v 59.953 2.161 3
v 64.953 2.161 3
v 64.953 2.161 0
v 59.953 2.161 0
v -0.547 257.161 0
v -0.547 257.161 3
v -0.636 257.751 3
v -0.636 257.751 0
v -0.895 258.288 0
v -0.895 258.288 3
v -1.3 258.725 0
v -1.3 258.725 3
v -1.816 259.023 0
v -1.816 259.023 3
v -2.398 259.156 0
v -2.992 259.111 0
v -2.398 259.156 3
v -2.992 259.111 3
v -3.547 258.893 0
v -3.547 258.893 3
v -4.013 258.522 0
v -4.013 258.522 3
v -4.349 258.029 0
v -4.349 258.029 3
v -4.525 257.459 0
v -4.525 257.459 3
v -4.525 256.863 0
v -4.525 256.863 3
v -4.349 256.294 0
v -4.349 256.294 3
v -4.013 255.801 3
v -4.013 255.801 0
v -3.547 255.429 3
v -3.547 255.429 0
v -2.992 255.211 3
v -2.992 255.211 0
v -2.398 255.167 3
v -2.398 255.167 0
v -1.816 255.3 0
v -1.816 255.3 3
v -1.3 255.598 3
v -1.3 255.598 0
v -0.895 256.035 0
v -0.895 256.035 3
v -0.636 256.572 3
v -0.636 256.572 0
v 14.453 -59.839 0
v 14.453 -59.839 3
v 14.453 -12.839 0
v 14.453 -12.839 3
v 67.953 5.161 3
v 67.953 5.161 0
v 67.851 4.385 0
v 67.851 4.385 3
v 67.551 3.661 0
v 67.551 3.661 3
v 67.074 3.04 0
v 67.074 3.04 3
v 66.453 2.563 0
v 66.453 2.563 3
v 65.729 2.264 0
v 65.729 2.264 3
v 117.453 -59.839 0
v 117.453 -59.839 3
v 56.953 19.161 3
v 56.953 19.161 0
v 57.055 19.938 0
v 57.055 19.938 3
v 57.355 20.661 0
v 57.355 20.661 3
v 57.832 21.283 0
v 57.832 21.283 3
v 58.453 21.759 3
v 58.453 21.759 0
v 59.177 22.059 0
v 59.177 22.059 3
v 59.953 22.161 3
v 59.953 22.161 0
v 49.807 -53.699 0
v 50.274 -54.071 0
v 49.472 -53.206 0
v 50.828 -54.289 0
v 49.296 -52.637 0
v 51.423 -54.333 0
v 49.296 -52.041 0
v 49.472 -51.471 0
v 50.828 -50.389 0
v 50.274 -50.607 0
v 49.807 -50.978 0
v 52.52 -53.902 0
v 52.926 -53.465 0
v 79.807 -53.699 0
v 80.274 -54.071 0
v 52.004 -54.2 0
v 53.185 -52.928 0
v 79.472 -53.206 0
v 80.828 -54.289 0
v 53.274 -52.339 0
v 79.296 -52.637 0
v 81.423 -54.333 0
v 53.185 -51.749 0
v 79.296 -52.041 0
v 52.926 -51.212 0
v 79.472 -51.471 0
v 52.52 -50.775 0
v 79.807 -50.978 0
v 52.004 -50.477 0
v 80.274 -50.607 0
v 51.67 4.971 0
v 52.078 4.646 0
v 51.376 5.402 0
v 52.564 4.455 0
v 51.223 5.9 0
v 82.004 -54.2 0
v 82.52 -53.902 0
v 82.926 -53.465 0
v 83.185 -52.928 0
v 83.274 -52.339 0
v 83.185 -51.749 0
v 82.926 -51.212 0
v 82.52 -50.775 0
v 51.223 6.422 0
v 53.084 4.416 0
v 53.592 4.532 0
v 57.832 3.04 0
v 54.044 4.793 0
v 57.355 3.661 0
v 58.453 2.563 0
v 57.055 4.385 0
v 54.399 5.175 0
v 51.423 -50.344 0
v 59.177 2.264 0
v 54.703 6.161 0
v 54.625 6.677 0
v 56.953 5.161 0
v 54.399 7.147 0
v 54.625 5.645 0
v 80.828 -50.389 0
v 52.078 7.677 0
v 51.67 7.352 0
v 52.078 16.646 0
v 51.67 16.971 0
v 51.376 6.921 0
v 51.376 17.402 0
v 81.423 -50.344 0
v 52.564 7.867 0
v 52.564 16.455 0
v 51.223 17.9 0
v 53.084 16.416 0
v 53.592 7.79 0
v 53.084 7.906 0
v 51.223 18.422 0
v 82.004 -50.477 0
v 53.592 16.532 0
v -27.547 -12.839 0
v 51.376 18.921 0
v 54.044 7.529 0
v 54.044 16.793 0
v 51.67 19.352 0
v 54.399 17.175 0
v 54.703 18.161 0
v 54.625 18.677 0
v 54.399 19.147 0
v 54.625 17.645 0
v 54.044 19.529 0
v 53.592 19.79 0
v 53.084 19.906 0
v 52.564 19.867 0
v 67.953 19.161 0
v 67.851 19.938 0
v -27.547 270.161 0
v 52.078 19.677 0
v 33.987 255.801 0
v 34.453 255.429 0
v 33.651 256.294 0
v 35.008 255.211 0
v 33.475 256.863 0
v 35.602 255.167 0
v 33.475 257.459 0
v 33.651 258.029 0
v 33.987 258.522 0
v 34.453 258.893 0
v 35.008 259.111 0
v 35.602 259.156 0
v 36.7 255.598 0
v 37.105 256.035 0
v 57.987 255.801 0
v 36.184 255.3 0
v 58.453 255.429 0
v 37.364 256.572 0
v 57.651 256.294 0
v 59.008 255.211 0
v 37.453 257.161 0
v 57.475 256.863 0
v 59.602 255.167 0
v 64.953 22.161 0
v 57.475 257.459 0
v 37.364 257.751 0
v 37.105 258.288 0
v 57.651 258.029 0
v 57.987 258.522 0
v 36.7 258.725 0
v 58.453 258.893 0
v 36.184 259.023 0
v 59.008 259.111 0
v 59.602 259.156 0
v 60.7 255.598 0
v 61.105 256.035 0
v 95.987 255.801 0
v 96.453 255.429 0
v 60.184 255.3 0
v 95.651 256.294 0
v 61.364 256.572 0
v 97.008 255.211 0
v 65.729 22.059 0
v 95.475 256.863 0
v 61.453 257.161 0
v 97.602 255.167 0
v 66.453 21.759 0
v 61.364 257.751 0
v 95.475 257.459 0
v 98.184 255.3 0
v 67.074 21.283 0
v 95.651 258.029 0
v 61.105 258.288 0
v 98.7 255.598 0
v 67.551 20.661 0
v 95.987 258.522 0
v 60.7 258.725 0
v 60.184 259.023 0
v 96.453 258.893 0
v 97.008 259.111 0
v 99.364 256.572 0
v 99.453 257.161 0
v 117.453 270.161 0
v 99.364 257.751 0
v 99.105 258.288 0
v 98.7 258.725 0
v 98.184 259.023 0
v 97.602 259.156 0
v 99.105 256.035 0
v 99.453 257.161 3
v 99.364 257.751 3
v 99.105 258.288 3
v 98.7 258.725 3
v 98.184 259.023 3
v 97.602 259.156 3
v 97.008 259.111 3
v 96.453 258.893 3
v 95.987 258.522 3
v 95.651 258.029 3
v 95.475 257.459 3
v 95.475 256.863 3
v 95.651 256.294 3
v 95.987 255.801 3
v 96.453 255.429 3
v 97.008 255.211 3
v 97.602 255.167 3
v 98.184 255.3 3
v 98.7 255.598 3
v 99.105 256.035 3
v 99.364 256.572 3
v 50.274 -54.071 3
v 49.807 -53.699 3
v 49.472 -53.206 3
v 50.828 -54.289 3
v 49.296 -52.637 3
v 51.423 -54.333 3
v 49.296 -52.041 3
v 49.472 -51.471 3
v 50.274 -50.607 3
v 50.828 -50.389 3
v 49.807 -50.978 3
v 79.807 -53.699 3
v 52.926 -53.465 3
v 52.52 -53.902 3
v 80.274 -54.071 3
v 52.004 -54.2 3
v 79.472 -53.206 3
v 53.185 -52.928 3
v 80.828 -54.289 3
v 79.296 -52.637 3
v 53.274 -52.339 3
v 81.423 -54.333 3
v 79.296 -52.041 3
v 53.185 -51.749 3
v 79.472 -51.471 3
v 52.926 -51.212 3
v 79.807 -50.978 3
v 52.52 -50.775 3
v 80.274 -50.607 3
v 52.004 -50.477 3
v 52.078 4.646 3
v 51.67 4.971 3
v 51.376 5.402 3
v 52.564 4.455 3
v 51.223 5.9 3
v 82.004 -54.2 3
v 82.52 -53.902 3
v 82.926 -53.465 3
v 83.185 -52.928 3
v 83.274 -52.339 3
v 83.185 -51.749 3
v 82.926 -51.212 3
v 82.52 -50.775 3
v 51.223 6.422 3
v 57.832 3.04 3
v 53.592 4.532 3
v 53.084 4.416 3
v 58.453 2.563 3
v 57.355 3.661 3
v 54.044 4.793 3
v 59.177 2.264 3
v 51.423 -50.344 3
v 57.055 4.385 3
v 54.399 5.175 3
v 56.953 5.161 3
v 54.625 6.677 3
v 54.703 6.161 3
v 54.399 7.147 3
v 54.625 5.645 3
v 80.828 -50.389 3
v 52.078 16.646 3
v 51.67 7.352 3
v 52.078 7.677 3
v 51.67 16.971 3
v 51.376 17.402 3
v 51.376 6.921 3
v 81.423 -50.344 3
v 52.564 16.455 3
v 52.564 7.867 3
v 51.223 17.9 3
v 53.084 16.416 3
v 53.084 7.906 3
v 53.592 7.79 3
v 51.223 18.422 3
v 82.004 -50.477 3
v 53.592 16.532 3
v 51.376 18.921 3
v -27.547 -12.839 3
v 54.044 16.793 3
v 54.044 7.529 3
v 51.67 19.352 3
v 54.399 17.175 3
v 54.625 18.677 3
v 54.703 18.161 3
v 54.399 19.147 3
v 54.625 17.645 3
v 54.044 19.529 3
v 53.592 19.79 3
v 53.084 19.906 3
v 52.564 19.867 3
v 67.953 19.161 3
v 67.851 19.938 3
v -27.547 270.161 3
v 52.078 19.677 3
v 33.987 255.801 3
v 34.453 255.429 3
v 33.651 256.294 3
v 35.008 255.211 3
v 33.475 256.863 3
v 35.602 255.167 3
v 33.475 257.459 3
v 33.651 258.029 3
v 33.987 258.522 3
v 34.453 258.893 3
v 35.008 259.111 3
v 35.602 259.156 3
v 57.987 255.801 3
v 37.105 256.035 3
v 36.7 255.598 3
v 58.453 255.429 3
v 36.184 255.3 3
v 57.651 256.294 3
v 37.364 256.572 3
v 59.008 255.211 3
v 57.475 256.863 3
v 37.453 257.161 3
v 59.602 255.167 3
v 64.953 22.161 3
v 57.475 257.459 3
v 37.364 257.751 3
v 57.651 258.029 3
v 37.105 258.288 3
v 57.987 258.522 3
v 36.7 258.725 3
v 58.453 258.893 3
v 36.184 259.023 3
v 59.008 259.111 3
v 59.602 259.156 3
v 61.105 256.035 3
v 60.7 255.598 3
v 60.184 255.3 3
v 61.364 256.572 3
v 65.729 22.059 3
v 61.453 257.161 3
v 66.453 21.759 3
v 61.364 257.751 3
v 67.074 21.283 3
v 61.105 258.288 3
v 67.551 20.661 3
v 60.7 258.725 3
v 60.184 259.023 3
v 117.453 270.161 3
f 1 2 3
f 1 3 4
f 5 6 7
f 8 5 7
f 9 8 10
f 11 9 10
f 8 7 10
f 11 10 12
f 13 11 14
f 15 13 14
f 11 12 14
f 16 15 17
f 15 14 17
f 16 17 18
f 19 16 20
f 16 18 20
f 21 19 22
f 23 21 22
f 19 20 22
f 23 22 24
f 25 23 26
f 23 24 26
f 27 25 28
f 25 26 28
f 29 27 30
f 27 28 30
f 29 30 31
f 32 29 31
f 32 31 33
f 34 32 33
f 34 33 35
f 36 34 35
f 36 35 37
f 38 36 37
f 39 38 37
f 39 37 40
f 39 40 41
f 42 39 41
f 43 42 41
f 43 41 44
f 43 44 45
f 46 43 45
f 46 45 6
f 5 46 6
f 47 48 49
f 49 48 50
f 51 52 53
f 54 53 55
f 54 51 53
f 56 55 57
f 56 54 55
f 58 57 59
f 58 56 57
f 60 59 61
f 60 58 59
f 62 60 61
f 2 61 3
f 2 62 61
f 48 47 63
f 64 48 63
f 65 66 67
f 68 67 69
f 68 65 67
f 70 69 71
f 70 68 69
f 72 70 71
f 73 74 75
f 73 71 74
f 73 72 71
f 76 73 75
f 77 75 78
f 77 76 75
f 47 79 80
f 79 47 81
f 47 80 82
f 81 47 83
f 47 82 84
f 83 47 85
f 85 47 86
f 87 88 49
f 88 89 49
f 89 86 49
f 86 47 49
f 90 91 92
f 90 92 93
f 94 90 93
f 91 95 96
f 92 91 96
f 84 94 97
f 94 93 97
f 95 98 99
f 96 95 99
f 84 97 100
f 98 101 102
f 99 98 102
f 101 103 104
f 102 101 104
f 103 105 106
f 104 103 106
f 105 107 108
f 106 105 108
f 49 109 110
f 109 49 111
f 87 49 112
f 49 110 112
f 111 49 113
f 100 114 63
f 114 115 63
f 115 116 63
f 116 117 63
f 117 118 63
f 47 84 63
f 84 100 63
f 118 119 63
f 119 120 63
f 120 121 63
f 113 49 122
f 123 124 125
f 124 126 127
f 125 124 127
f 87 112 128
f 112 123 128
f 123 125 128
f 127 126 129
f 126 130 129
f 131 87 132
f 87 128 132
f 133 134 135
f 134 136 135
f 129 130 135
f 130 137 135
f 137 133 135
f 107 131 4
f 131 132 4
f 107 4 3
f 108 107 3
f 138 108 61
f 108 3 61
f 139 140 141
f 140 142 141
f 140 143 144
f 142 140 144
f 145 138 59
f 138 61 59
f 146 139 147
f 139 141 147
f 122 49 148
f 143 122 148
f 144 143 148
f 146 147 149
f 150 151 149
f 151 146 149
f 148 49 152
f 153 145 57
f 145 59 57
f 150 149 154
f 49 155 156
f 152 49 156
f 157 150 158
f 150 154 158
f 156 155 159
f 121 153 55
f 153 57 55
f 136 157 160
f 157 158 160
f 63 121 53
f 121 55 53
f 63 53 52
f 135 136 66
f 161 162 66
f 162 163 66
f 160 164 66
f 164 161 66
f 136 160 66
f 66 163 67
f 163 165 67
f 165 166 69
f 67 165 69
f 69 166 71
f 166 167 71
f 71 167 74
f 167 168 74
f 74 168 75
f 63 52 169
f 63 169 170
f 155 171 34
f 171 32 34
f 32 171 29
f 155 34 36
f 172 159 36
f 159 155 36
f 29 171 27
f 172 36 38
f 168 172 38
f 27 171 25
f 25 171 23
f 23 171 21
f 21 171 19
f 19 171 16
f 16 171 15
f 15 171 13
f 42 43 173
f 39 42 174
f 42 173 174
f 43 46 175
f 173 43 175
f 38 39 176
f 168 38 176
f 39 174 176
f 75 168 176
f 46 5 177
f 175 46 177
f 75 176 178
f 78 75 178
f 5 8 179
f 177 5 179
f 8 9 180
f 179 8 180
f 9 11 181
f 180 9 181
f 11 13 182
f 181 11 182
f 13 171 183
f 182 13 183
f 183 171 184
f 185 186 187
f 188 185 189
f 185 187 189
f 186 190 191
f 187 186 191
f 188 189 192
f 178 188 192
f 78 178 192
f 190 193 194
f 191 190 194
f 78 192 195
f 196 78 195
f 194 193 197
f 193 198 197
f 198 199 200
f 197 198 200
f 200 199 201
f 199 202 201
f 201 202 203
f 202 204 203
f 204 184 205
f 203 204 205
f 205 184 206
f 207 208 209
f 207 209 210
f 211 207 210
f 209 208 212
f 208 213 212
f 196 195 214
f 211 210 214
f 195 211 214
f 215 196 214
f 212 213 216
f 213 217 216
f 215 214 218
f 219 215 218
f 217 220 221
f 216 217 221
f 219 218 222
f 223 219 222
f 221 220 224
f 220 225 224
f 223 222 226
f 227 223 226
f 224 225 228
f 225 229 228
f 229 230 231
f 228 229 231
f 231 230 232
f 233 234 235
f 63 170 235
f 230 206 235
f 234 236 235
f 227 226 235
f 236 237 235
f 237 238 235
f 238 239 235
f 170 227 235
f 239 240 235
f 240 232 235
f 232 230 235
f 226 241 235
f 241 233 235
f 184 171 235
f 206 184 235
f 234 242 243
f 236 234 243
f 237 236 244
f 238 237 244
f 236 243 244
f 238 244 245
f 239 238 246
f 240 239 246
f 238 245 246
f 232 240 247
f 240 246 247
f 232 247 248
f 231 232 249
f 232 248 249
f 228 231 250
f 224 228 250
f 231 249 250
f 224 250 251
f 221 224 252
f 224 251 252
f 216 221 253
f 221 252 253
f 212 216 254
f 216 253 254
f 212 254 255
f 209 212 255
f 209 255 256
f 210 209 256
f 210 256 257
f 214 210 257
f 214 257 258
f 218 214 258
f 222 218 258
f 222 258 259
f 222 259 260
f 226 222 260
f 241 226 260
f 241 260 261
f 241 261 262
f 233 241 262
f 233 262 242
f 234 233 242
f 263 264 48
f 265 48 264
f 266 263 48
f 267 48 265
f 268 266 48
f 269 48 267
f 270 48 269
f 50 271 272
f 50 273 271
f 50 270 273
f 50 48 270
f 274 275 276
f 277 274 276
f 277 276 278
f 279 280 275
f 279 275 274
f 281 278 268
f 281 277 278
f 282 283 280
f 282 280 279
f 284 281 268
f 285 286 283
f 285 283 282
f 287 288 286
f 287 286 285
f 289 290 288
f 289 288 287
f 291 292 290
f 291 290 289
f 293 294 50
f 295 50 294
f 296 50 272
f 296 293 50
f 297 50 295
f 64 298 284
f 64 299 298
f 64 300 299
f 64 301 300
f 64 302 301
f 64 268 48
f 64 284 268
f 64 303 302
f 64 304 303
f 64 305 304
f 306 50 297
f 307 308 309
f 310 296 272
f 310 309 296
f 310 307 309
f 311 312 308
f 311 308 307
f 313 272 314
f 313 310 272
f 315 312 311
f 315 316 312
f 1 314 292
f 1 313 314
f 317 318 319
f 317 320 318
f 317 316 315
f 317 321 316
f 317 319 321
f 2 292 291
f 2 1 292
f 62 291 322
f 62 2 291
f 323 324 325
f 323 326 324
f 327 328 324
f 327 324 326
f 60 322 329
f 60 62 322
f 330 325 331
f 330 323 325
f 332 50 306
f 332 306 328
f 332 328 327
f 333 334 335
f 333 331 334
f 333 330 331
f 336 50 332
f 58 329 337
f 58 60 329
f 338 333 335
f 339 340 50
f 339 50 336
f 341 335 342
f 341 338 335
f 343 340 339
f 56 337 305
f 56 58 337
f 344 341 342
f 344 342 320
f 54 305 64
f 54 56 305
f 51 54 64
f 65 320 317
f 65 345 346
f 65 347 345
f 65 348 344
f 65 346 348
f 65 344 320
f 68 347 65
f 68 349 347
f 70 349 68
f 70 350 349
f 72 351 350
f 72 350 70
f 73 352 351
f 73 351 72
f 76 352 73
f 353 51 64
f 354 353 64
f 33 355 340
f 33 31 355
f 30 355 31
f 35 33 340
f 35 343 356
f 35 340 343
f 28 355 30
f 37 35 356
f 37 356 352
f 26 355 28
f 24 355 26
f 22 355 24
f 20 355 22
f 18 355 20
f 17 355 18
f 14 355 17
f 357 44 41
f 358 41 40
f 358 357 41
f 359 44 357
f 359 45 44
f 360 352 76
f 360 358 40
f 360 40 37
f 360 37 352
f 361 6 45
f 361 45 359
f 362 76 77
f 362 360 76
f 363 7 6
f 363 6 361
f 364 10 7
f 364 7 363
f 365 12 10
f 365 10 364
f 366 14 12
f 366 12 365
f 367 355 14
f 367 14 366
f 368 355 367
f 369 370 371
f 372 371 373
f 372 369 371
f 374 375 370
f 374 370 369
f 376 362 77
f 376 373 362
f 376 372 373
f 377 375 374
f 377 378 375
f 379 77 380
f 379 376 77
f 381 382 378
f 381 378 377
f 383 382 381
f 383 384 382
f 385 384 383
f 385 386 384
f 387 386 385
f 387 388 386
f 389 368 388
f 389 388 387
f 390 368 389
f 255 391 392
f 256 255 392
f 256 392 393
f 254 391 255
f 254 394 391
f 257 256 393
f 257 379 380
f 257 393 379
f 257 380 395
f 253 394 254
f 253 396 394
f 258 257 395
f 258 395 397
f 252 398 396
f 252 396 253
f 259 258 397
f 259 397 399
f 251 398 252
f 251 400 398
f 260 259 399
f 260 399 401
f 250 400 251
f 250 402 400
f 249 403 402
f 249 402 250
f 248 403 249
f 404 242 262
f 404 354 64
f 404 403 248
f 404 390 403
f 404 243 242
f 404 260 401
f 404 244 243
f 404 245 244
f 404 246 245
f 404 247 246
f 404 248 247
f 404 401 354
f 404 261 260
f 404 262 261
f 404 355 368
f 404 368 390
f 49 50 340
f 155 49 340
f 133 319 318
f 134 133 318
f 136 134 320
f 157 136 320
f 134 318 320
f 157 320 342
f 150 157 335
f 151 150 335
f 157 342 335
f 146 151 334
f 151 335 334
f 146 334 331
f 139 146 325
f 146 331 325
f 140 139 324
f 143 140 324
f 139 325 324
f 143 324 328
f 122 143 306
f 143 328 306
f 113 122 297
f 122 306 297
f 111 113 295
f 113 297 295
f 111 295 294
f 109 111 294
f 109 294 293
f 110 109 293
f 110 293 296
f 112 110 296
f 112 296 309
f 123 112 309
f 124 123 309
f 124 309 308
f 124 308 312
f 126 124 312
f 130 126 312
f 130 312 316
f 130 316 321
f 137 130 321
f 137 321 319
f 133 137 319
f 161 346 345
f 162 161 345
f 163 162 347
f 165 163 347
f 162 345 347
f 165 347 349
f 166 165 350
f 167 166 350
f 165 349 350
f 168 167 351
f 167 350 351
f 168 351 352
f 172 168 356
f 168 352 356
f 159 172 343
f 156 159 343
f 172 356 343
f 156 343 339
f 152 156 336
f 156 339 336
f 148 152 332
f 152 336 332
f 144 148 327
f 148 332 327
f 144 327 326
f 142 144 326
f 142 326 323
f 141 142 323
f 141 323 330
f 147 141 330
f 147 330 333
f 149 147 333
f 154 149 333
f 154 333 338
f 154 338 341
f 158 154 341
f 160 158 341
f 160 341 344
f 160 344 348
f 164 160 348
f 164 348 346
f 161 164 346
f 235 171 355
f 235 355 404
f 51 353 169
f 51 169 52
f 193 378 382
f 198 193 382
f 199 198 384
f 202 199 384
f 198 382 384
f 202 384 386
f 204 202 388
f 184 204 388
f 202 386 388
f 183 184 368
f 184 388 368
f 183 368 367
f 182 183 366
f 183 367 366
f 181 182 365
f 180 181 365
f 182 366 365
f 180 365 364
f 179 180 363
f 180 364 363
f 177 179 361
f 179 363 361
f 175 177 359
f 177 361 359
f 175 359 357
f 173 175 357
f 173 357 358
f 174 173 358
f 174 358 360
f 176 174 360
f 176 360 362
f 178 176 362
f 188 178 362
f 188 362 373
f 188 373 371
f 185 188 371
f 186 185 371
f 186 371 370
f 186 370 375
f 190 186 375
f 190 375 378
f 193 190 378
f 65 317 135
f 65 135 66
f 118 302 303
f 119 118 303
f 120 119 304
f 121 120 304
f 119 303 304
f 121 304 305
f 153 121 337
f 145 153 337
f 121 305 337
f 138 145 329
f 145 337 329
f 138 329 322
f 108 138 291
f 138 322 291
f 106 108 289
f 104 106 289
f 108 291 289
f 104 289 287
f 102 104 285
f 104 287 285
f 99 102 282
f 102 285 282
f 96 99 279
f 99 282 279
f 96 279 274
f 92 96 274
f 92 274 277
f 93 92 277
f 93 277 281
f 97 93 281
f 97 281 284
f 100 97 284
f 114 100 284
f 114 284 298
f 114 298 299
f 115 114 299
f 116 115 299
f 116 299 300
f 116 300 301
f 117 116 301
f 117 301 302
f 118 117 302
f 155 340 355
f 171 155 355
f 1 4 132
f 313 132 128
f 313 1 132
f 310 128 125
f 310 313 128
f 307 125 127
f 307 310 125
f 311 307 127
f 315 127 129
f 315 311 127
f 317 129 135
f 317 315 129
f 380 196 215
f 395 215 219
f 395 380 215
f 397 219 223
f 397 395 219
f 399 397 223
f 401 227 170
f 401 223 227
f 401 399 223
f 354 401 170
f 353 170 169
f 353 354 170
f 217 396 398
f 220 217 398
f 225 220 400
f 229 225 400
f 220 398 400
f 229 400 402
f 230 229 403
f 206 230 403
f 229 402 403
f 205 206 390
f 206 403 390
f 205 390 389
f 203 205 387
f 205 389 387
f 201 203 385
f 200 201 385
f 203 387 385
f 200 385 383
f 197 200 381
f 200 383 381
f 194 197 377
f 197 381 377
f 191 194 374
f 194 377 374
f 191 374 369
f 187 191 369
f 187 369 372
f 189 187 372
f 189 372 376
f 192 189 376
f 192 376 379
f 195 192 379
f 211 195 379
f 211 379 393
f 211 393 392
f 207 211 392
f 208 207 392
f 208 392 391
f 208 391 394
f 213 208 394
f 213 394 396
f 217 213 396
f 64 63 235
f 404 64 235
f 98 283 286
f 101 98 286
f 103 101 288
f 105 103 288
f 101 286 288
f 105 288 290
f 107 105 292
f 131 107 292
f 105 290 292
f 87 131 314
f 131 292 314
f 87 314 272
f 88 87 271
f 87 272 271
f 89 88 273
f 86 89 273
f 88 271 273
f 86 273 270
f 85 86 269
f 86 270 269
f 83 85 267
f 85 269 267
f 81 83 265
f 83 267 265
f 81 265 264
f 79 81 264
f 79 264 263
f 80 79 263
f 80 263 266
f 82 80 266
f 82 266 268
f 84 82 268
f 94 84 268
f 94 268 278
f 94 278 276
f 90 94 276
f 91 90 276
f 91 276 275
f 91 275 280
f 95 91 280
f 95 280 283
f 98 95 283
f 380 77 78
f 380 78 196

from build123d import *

# Parameters (mm, degrees)
ESQUISSE1_W             = 155
ESQUISSE1_H             = 330
BOSS_EXTRU_1_DEPTH      = 3
ENL_V_MAT_EXTRU_1_DEPTH = 10
ESQUISSE3_R             = 2
ENL_V_MAT_EXTRU_2_DEPTH = 10
ESQUISSE4_R             = 1.75
ENL_V_MAT_EXTRU_3_DEPTH = 10


with BuildPart() as part:
    # Esquisse1 → Boss.-Extru.1 (new body)
    with BuildSketch(Plane.XY):
        with Locations((39.953008068, 105.161286668)):
            Rectangle(ESQUISSE1_W, ESQUISSE1_H)
    extrude(amount=BOSS_EXTRU_1_DEPTH)

    # Esquisse2 → Enlèv. mat.-Extru.1 (cut)
    with BuildSketch(Plane.XY.offset(3)):
        Polygon((-27.546991932, -12.838713332), (-27.546991932, 270.161286668), (-37.546991932, 270.161286668), (-37.546991932, -12.838713332), (-37.546991932, -59.838713332), (14.453008068, -59.838713332), (14.453008068, -12.838713332), align=None)
    extrude(amount=-ENL_V_MAT_EXTRU_1_DEPTH, mode=Mode.SUBTRACT)

    # Esquisse3 → Enlèv. mat.-Extru.2 (cut)
    with BuildSketch(Plane.XY.offset(3)):
        with Locations((51.273516144, -52.338713332)):
            Circle(ESQUISSE3_R)
        with Locations((81.273516144, -52.338713332)):
            Circle(ESQUISSE3_R)
        with Locations((-2.546991932, 257.161286668)):
            Circle(ESQUISSE3_R)
        with Locations((35.453008068, 257.161286668)):
            Circle(ESQUISSE3_R)
        with Locations((59.453008068, 257.161286668)):
            Circle(ESQUISSE3_R)
        with Locations((97.453008068, 257.161286668)):
            Circle(ESQUISSE3_R)
    extrude(amount=-ENL_V_MAT_EXTRU_2_DEPTH, mode=Mode.SUBTRACT)

    # Esquisse4 → Enlèv. mat.-Extru.3 (cut)
    with BuildSketch(Plane.XY.offset(3)):
        with Locations((52.953008068, 18.161286668)):
            Circle(ESQUISSE4_R)
        with Locations((52.953008068, 6.161286668)):
            Circle(ESQUISSE4_R)
        with BuildLine():
            Line((56.953008068, 5.161286668), (56.953008068, 19.161286668))
            ThreePointArc((56.953008068, 19.161286668), (57.831687724, 21.282607011), (59.953008068, 22.161286668))
            Line((59.953008068, 22.161286668), (64.953008068, 22.161286668))
            ThreePointArc((64.953008068, 22.161286668), (67.074328411, 21.282607011), (67.953008068, 19.161286668))
            Line((67.953008068, 19.161286668), (67.953008068, 5.161286668))
            ThreePointArc((67.953008068, 5.161286668), (67.074328411, 3.039966324), (64.953008068, 2.161286668))
            Line((64.953008068, 2.161286668), (59.953008068, 2.161286668))
            ThreePointArc((59.953008068, 2.161286668), (57.831687724, 3.039966324), (56.953008068, 5.161286668))
        make_face()
    extrude(amount=-ENL_V_MAT_EXTRU_3_DEPTH, mode=Mode.SUBTRACT)


solid = part.part
